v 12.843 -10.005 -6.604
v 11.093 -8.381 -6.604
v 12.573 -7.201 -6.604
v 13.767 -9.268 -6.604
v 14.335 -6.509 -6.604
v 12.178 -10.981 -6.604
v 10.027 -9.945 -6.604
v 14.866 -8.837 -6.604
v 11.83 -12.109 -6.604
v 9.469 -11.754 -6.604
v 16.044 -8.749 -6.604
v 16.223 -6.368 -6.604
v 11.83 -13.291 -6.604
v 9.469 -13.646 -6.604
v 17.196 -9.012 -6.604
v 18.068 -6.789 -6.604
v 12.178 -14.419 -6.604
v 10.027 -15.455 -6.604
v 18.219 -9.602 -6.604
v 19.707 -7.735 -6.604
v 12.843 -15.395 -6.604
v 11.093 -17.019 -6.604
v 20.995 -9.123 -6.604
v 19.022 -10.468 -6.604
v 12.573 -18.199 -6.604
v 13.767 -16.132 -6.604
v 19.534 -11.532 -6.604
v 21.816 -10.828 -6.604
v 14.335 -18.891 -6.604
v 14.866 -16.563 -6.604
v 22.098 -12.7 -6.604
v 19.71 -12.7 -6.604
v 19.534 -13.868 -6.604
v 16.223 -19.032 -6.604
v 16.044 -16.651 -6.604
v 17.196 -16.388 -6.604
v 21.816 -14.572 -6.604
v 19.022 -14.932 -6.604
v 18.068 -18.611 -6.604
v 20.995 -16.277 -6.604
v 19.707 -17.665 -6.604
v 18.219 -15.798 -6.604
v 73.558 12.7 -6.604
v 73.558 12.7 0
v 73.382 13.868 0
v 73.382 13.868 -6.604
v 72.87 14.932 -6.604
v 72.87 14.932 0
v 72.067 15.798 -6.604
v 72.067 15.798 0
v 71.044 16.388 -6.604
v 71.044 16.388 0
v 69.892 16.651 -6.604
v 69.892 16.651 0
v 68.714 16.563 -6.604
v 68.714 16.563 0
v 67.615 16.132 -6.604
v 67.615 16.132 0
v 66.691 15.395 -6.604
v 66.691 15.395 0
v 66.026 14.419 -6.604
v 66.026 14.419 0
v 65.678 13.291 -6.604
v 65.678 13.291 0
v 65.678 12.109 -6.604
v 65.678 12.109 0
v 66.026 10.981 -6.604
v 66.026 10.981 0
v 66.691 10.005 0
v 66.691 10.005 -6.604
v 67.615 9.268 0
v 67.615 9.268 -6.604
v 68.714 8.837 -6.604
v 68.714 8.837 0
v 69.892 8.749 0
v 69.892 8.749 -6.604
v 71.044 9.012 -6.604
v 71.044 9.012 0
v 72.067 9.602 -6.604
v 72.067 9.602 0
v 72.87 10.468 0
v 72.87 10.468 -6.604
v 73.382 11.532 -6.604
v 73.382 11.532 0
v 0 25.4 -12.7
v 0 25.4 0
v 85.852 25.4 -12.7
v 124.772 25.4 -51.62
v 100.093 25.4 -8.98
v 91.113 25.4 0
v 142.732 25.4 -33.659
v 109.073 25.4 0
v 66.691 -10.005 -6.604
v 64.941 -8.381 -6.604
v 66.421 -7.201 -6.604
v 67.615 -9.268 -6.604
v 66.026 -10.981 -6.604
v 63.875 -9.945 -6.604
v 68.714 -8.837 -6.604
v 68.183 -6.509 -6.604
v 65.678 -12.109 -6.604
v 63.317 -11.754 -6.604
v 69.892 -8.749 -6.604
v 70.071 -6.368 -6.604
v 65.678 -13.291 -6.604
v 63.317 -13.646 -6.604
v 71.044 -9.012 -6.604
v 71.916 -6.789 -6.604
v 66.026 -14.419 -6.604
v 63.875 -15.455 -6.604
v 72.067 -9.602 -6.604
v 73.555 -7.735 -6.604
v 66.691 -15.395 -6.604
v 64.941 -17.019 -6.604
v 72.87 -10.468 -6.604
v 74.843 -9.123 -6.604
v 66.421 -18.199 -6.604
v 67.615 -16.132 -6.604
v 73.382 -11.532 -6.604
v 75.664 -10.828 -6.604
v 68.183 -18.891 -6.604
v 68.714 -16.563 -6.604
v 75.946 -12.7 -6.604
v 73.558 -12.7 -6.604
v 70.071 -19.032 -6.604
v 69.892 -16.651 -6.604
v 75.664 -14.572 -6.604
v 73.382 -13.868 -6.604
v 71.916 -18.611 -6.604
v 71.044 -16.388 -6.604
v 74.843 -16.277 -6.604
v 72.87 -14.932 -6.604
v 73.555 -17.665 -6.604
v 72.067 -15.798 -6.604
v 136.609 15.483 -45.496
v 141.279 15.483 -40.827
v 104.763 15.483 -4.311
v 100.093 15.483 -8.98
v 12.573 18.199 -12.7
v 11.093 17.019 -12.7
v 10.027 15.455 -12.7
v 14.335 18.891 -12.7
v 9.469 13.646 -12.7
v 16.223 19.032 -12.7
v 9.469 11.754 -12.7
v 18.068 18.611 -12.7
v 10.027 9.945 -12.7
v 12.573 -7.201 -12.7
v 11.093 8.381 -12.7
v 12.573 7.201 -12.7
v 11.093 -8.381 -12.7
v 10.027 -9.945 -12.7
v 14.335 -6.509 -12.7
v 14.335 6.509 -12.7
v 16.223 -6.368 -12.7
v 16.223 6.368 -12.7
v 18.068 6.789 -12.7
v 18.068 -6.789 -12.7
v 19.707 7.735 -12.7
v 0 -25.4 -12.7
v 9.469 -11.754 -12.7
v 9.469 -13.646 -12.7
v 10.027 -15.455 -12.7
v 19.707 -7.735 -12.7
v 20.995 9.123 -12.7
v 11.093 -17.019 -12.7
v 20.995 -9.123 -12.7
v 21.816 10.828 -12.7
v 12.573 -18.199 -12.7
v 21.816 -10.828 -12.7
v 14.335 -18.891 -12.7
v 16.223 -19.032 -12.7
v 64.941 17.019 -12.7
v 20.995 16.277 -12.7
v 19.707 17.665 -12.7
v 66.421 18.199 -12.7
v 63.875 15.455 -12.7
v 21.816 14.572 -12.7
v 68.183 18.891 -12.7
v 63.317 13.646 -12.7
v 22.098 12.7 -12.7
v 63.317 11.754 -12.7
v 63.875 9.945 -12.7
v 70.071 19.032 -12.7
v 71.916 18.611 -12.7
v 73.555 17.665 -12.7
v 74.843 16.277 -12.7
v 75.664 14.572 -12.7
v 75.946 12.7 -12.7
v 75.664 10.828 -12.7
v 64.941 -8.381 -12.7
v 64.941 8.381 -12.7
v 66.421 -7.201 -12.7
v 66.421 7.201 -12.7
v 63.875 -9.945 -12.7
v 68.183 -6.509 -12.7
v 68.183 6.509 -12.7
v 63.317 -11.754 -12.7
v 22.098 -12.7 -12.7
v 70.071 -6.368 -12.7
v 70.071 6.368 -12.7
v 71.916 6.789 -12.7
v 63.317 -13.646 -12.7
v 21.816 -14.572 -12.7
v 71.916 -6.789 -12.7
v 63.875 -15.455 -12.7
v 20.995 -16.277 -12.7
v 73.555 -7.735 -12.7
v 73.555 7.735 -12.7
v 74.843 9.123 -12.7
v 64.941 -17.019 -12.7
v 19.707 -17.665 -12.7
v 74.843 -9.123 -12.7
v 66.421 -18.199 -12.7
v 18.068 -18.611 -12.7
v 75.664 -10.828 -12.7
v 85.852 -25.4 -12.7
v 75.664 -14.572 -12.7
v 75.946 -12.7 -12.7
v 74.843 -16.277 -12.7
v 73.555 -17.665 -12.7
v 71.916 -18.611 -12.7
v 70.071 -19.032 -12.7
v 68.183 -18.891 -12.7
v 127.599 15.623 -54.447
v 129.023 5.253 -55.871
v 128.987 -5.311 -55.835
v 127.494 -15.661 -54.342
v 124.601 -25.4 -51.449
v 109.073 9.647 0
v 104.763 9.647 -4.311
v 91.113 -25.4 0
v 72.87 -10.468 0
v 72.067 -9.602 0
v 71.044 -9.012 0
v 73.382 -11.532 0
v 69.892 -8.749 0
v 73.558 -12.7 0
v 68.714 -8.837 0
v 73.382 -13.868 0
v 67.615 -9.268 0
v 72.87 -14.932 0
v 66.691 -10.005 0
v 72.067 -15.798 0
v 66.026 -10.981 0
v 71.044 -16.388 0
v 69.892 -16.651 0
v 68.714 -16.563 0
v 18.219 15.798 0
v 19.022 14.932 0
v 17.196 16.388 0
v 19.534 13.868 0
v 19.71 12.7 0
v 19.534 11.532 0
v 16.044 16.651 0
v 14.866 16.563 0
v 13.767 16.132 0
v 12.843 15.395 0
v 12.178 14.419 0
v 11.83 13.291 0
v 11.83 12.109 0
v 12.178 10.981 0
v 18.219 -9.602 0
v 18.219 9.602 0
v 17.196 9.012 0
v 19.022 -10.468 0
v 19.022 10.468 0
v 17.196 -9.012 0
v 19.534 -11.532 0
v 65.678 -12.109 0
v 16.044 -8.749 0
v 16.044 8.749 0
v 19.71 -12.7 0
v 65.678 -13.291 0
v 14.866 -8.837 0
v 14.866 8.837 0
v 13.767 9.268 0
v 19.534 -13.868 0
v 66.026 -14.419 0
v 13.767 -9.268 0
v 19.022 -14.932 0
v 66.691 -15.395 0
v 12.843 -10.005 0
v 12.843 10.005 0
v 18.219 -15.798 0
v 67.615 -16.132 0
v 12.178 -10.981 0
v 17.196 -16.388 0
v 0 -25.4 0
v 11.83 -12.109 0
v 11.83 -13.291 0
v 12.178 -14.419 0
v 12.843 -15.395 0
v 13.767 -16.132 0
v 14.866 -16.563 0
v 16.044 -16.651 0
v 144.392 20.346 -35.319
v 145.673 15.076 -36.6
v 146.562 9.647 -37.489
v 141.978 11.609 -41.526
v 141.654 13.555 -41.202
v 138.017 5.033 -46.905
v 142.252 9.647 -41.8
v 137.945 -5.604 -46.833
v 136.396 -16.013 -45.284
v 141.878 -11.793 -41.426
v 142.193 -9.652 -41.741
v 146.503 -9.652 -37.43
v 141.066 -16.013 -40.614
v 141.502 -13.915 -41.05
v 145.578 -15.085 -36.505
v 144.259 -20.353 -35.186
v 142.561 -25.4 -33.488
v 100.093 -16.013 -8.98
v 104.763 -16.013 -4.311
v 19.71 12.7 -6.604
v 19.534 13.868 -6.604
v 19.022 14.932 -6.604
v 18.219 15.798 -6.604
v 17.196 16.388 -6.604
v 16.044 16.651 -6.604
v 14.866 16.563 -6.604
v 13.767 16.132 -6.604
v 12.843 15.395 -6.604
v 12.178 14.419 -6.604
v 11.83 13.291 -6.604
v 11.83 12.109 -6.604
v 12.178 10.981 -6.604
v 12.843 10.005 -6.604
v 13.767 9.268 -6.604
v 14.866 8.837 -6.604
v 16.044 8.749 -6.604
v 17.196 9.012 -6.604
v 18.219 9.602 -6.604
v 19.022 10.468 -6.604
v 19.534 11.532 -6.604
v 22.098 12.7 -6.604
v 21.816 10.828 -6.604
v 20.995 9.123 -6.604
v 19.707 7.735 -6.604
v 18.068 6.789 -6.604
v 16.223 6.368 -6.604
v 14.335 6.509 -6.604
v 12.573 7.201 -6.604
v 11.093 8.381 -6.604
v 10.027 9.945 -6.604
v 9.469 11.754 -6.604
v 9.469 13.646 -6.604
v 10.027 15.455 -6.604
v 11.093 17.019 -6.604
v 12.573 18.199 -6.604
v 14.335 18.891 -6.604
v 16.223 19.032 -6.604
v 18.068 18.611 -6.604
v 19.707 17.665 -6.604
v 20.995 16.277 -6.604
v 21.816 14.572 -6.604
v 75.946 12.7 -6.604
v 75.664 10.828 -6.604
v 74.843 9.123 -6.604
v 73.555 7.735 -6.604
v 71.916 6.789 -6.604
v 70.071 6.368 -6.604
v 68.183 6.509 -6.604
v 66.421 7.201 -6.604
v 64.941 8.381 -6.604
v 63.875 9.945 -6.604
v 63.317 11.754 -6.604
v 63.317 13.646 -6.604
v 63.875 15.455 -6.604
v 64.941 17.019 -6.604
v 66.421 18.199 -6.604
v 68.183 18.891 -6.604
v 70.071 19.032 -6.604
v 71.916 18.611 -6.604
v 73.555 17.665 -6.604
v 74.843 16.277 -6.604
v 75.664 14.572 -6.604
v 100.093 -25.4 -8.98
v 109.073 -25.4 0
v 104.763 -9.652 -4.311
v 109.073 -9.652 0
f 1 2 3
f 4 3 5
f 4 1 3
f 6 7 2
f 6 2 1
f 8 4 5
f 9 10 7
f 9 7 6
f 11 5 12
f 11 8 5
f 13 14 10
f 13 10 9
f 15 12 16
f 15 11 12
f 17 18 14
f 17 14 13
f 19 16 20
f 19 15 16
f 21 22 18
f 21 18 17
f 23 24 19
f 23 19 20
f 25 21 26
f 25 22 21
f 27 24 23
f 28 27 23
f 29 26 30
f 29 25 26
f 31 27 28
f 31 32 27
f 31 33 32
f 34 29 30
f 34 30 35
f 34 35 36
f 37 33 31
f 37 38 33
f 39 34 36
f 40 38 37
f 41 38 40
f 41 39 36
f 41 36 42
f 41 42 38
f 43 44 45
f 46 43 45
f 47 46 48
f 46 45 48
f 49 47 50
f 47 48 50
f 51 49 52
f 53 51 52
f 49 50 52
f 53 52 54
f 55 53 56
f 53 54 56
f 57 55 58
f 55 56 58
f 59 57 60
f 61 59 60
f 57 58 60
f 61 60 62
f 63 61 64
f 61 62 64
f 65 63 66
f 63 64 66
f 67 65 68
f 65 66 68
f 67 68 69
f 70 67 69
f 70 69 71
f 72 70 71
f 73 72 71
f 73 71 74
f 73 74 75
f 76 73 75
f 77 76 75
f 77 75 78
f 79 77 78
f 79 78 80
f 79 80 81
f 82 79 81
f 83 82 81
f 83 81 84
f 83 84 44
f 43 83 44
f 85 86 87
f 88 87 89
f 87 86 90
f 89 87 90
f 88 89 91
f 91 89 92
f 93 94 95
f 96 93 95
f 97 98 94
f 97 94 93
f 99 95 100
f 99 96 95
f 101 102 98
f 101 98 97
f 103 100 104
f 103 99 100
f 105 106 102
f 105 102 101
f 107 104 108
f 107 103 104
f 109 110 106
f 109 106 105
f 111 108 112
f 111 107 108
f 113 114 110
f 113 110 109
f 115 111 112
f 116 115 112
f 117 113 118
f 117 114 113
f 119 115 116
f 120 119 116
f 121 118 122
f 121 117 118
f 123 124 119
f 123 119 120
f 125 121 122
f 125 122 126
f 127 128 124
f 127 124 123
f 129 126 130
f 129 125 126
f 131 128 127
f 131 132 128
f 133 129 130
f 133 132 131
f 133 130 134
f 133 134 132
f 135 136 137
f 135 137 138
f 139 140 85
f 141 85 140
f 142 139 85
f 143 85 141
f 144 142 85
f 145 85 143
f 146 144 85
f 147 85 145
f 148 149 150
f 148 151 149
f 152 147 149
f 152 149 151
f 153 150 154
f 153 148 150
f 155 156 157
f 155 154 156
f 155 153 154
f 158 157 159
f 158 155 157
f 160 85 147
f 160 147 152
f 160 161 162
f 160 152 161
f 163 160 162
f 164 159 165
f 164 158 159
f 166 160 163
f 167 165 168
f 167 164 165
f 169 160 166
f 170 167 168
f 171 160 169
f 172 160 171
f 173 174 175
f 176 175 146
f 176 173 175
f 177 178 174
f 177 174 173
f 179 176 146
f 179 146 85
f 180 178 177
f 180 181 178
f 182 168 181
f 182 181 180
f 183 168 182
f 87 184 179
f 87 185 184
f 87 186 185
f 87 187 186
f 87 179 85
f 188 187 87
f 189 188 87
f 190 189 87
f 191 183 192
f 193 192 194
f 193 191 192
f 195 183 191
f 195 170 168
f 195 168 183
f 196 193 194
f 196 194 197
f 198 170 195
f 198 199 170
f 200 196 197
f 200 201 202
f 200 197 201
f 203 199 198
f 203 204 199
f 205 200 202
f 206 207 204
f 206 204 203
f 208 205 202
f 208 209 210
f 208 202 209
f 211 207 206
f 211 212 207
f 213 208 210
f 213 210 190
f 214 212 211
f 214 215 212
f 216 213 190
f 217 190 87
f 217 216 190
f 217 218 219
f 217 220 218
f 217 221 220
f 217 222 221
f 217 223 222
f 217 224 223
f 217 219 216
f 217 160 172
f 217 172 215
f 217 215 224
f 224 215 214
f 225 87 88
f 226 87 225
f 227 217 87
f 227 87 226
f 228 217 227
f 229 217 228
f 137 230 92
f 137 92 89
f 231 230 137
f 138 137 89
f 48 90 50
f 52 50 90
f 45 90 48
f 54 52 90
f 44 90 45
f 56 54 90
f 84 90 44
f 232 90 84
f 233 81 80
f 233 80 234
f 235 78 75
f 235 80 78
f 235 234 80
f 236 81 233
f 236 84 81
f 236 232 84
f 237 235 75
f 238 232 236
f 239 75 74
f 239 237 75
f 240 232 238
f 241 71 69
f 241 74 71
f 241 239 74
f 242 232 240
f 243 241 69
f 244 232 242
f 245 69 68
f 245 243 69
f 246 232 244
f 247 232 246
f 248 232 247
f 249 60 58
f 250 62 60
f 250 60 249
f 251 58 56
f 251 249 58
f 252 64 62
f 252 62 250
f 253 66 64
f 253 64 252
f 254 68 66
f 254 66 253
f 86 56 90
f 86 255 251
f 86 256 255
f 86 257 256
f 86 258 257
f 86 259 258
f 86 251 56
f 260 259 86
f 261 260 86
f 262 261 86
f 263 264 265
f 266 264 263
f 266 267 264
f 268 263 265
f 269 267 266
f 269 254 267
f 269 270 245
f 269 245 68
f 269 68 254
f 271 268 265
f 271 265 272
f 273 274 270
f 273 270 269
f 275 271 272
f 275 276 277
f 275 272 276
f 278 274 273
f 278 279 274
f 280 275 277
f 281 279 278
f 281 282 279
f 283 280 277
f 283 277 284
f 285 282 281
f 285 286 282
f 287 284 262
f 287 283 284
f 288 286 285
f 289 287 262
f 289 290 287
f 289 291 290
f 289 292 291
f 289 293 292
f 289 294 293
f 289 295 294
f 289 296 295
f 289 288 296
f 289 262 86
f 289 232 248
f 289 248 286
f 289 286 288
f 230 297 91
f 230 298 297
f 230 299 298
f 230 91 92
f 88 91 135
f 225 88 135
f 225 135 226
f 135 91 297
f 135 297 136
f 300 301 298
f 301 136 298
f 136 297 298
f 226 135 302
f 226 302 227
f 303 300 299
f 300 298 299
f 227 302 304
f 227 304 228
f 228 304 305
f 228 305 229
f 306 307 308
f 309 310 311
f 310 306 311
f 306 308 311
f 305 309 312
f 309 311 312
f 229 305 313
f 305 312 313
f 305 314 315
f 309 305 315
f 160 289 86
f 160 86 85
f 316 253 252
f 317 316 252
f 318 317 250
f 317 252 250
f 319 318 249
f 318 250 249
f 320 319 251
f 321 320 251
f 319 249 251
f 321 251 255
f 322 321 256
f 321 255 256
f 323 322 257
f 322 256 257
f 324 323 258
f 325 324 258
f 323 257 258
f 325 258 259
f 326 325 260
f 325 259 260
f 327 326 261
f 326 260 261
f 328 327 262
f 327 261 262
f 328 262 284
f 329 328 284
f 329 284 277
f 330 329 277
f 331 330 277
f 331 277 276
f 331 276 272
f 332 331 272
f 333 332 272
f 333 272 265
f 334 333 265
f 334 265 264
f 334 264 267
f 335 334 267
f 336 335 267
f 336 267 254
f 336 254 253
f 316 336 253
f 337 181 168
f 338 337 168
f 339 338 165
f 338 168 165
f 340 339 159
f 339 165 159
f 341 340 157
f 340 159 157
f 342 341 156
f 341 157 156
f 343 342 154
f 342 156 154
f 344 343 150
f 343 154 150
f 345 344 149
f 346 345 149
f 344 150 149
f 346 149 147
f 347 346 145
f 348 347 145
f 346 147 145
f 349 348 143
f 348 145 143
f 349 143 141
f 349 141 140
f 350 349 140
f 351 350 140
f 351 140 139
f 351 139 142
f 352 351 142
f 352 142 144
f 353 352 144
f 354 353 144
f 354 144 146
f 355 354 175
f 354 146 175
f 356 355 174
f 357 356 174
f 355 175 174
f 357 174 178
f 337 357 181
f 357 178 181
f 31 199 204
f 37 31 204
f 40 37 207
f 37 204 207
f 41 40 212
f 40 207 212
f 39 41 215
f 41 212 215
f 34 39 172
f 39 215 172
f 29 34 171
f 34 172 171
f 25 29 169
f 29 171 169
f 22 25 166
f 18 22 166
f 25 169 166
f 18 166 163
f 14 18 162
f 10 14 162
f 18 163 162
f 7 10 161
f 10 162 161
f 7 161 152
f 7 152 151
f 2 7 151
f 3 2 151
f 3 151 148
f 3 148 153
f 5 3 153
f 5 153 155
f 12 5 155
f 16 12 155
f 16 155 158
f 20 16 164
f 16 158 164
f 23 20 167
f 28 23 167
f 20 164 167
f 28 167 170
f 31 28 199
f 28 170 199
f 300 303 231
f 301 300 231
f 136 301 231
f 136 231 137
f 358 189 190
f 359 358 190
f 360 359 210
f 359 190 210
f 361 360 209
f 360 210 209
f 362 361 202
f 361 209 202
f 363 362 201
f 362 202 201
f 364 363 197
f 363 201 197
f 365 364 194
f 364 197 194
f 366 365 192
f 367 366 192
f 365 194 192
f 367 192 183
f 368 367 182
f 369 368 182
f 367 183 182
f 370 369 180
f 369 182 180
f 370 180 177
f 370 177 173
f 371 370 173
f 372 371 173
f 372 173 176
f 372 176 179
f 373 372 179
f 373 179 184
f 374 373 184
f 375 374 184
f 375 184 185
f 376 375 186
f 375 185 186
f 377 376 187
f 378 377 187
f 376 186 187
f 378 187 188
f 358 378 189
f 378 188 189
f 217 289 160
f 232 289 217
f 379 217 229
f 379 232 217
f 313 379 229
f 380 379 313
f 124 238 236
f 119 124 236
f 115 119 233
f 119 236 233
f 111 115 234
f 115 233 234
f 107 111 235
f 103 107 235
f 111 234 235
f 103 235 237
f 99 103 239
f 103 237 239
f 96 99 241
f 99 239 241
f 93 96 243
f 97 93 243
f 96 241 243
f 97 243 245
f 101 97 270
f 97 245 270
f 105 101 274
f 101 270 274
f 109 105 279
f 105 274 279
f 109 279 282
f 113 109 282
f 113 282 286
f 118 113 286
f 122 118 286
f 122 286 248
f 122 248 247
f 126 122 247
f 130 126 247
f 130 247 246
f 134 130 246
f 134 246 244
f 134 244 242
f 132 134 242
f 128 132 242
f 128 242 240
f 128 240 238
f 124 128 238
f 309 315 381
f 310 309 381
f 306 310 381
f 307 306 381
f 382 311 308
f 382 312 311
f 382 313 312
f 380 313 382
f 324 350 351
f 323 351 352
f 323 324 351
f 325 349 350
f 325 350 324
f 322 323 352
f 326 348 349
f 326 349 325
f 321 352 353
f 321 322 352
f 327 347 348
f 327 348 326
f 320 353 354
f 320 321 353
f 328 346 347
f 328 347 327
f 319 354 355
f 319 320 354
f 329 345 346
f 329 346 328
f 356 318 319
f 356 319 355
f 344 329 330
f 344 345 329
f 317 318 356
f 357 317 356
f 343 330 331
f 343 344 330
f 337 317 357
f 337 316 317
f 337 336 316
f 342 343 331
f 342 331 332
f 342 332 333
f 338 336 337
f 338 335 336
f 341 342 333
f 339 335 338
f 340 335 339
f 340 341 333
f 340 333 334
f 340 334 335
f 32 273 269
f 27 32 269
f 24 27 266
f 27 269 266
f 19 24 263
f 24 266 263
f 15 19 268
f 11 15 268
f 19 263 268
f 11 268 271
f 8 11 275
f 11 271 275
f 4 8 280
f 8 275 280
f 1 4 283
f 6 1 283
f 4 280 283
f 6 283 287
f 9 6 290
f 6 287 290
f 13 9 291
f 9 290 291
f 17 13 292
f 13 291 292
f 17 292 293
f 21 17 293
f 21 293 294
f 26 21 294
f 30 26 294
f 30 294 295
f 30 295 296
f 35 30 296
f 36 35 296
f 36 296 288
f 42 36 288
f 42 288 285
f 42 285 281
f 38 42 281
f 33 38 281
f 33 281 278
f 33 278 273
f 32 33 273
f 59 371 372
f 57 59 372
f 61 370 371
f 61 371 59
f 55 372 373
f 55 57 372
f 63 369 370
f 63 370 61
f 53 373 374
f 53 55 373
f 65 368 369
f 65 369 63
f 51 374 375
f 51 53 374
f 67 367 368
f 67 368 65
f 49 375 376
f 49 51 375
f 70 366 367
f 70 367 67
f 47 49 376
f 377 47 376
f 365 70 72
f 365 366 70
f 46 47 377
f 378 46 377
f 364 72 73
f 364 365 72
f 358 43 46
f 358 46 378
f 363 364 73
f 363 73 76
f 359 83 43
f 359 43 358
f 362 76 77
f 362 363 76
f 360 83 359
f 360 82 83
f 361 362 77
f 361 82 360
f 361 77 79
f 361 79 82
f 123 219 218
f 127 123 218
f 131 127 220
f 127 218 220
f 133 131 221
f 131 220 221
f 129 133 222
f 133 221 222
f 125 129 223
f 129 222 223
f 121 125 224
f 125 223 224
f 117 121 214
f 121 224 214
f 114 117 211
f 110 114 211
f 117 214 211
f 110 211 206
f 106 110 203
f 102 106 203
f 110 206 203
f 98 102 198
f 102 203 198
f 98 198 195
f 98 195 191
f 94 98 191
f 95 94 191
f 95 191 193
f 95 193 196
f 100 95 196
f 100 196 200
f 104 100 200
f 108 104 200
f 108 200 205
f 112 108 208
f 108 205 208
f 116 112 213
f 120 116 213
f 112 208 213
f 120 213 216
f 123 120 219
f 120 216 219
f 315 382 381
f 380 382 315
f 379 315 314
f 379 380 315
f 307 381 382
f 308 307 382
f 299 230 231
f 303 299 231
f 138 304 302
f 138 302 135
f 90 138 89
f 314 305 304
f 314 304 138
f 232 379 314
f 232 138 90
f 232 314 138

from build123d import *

# Parameters (mm, degrees)
F1_DEPTH  = 25.4
F2_R      = 3.9624
F3_DEPTH  = 58.55227
F4_R      = 6.35
F5_DEPTH  = 6.096
F7_DEPTH  = 25.4
F8_DEPTH  = 25.4
F10_DEPTH = 66.549


with BuildPart() as f1:
    # F0 (on Front) → F1 (new body, symmetric)
    with BuildSketch(Plane.XZ):
        Polygon((91.112512, 0), (0, 0), (0, -12.7), (85.852, -12.7), (131.70327, -58.55127), (149.663782, -40.590758), (109.073024, 0), (100.092768, -8.980256), align=None)
    extrude(amount=F1_DEPTH, both=True)

    # F2 (on face) → F3 (cut, through all)
    with BuildSketch(Plane.XY):
        with Locations((15.748, 12.7)):
            Circle(F2_R)
        with Locations((15.748, -12.7)):
            Circle(F2_R)
        with Locations((69.596, 12.7)):
            Circle(F2_R)
        with Locations((69.596, -12.7)):
            Circle(F2_R)
    extrude(amount=-F3_DEPTH, mode=Mode.SUBTRACT)

    # F4 (on face) → F5 (cut)
    with BuildSketch(Plane(origin=(0, 0, -12.7), x_dir=(1, 0, 0), z_dir=(0, 0, -1))):
        with Locations((15.748, 12.7)):
            Circle(F4_R)
        with Locations((15.748, -12.7)):
            Circle(F4_R)
        with Locations((69.596, -12.7)):
            Circle(F4_R)
        with Locations((69.596, 12.7)):
            Circle(F4_R)
    extrude(amount=-F5_DEPTH, mode=Mode.SUBTRACT)

    # F6 (on face) → F7 (join)
    with BuildSketch(Plane(origin=(54.536512, 0, 54.536512), x_dir=(0.707107, 0, -0.707107), z_dir=(0.707107, 0, 0.707107))):
        with BuildLine():
            ThreePointArc((124.727698, 25.4), (130.973663, -0.030356), (124.485501, -25.4))
            Line((124.485501, -25.4), (134.530275, -25.4))
            Line((134.530275, -25.4), (134.530275, 25.4))
            Line((134.530275, 25.4), (124.727698, 25.4))
        make_face()
    extrude(amount=-F7_DEPTH)

    # F6 (on face) → F8 (cut)
    with BuildSketch(Plane(origin=(54.536512, 0, 54.536512), x_dir=(0.707107, 0, -0.707107), z_dir=(0.707107, 0, 0.707107))):
        with BuildLine():
            ThreePointArc((124.727698, 25.4), (130.973663, -0.030356), (124.485501, -25.4))
            Line((124.485501, -25.4), (134.530275, -25.4))
            Line((134.530275, -25.4), (134.530275, 25.4))
            Line((134.530275, 25.4), (124.727698, 25.4))
        make_face()
    extrude(amount=-F8_DEPTH, mode=Mode.SUBTRACT)

    # F9 (on face) → F10 (cut, through all)
    with BuildSketch(Plane(origin=(54.536512, 0, -54.536512), x_dir=(0, -1, 0), z_dir=(-0.707107, 0, 0.707107))):
        Polygon((9.652, 71.030275), (9.652, 77.126275), (-9.646871, 77.126275), (-9.646871, 71.030275), (-15.48255, 71.030275), (-15.48255, 64.426275), (16.01345, 64.426275), (16.01345, 71.030275), align=None)
    extrude(amount=-F10_DEPTH, mode=Mode.SUBTRACT)


solid = f1.part
